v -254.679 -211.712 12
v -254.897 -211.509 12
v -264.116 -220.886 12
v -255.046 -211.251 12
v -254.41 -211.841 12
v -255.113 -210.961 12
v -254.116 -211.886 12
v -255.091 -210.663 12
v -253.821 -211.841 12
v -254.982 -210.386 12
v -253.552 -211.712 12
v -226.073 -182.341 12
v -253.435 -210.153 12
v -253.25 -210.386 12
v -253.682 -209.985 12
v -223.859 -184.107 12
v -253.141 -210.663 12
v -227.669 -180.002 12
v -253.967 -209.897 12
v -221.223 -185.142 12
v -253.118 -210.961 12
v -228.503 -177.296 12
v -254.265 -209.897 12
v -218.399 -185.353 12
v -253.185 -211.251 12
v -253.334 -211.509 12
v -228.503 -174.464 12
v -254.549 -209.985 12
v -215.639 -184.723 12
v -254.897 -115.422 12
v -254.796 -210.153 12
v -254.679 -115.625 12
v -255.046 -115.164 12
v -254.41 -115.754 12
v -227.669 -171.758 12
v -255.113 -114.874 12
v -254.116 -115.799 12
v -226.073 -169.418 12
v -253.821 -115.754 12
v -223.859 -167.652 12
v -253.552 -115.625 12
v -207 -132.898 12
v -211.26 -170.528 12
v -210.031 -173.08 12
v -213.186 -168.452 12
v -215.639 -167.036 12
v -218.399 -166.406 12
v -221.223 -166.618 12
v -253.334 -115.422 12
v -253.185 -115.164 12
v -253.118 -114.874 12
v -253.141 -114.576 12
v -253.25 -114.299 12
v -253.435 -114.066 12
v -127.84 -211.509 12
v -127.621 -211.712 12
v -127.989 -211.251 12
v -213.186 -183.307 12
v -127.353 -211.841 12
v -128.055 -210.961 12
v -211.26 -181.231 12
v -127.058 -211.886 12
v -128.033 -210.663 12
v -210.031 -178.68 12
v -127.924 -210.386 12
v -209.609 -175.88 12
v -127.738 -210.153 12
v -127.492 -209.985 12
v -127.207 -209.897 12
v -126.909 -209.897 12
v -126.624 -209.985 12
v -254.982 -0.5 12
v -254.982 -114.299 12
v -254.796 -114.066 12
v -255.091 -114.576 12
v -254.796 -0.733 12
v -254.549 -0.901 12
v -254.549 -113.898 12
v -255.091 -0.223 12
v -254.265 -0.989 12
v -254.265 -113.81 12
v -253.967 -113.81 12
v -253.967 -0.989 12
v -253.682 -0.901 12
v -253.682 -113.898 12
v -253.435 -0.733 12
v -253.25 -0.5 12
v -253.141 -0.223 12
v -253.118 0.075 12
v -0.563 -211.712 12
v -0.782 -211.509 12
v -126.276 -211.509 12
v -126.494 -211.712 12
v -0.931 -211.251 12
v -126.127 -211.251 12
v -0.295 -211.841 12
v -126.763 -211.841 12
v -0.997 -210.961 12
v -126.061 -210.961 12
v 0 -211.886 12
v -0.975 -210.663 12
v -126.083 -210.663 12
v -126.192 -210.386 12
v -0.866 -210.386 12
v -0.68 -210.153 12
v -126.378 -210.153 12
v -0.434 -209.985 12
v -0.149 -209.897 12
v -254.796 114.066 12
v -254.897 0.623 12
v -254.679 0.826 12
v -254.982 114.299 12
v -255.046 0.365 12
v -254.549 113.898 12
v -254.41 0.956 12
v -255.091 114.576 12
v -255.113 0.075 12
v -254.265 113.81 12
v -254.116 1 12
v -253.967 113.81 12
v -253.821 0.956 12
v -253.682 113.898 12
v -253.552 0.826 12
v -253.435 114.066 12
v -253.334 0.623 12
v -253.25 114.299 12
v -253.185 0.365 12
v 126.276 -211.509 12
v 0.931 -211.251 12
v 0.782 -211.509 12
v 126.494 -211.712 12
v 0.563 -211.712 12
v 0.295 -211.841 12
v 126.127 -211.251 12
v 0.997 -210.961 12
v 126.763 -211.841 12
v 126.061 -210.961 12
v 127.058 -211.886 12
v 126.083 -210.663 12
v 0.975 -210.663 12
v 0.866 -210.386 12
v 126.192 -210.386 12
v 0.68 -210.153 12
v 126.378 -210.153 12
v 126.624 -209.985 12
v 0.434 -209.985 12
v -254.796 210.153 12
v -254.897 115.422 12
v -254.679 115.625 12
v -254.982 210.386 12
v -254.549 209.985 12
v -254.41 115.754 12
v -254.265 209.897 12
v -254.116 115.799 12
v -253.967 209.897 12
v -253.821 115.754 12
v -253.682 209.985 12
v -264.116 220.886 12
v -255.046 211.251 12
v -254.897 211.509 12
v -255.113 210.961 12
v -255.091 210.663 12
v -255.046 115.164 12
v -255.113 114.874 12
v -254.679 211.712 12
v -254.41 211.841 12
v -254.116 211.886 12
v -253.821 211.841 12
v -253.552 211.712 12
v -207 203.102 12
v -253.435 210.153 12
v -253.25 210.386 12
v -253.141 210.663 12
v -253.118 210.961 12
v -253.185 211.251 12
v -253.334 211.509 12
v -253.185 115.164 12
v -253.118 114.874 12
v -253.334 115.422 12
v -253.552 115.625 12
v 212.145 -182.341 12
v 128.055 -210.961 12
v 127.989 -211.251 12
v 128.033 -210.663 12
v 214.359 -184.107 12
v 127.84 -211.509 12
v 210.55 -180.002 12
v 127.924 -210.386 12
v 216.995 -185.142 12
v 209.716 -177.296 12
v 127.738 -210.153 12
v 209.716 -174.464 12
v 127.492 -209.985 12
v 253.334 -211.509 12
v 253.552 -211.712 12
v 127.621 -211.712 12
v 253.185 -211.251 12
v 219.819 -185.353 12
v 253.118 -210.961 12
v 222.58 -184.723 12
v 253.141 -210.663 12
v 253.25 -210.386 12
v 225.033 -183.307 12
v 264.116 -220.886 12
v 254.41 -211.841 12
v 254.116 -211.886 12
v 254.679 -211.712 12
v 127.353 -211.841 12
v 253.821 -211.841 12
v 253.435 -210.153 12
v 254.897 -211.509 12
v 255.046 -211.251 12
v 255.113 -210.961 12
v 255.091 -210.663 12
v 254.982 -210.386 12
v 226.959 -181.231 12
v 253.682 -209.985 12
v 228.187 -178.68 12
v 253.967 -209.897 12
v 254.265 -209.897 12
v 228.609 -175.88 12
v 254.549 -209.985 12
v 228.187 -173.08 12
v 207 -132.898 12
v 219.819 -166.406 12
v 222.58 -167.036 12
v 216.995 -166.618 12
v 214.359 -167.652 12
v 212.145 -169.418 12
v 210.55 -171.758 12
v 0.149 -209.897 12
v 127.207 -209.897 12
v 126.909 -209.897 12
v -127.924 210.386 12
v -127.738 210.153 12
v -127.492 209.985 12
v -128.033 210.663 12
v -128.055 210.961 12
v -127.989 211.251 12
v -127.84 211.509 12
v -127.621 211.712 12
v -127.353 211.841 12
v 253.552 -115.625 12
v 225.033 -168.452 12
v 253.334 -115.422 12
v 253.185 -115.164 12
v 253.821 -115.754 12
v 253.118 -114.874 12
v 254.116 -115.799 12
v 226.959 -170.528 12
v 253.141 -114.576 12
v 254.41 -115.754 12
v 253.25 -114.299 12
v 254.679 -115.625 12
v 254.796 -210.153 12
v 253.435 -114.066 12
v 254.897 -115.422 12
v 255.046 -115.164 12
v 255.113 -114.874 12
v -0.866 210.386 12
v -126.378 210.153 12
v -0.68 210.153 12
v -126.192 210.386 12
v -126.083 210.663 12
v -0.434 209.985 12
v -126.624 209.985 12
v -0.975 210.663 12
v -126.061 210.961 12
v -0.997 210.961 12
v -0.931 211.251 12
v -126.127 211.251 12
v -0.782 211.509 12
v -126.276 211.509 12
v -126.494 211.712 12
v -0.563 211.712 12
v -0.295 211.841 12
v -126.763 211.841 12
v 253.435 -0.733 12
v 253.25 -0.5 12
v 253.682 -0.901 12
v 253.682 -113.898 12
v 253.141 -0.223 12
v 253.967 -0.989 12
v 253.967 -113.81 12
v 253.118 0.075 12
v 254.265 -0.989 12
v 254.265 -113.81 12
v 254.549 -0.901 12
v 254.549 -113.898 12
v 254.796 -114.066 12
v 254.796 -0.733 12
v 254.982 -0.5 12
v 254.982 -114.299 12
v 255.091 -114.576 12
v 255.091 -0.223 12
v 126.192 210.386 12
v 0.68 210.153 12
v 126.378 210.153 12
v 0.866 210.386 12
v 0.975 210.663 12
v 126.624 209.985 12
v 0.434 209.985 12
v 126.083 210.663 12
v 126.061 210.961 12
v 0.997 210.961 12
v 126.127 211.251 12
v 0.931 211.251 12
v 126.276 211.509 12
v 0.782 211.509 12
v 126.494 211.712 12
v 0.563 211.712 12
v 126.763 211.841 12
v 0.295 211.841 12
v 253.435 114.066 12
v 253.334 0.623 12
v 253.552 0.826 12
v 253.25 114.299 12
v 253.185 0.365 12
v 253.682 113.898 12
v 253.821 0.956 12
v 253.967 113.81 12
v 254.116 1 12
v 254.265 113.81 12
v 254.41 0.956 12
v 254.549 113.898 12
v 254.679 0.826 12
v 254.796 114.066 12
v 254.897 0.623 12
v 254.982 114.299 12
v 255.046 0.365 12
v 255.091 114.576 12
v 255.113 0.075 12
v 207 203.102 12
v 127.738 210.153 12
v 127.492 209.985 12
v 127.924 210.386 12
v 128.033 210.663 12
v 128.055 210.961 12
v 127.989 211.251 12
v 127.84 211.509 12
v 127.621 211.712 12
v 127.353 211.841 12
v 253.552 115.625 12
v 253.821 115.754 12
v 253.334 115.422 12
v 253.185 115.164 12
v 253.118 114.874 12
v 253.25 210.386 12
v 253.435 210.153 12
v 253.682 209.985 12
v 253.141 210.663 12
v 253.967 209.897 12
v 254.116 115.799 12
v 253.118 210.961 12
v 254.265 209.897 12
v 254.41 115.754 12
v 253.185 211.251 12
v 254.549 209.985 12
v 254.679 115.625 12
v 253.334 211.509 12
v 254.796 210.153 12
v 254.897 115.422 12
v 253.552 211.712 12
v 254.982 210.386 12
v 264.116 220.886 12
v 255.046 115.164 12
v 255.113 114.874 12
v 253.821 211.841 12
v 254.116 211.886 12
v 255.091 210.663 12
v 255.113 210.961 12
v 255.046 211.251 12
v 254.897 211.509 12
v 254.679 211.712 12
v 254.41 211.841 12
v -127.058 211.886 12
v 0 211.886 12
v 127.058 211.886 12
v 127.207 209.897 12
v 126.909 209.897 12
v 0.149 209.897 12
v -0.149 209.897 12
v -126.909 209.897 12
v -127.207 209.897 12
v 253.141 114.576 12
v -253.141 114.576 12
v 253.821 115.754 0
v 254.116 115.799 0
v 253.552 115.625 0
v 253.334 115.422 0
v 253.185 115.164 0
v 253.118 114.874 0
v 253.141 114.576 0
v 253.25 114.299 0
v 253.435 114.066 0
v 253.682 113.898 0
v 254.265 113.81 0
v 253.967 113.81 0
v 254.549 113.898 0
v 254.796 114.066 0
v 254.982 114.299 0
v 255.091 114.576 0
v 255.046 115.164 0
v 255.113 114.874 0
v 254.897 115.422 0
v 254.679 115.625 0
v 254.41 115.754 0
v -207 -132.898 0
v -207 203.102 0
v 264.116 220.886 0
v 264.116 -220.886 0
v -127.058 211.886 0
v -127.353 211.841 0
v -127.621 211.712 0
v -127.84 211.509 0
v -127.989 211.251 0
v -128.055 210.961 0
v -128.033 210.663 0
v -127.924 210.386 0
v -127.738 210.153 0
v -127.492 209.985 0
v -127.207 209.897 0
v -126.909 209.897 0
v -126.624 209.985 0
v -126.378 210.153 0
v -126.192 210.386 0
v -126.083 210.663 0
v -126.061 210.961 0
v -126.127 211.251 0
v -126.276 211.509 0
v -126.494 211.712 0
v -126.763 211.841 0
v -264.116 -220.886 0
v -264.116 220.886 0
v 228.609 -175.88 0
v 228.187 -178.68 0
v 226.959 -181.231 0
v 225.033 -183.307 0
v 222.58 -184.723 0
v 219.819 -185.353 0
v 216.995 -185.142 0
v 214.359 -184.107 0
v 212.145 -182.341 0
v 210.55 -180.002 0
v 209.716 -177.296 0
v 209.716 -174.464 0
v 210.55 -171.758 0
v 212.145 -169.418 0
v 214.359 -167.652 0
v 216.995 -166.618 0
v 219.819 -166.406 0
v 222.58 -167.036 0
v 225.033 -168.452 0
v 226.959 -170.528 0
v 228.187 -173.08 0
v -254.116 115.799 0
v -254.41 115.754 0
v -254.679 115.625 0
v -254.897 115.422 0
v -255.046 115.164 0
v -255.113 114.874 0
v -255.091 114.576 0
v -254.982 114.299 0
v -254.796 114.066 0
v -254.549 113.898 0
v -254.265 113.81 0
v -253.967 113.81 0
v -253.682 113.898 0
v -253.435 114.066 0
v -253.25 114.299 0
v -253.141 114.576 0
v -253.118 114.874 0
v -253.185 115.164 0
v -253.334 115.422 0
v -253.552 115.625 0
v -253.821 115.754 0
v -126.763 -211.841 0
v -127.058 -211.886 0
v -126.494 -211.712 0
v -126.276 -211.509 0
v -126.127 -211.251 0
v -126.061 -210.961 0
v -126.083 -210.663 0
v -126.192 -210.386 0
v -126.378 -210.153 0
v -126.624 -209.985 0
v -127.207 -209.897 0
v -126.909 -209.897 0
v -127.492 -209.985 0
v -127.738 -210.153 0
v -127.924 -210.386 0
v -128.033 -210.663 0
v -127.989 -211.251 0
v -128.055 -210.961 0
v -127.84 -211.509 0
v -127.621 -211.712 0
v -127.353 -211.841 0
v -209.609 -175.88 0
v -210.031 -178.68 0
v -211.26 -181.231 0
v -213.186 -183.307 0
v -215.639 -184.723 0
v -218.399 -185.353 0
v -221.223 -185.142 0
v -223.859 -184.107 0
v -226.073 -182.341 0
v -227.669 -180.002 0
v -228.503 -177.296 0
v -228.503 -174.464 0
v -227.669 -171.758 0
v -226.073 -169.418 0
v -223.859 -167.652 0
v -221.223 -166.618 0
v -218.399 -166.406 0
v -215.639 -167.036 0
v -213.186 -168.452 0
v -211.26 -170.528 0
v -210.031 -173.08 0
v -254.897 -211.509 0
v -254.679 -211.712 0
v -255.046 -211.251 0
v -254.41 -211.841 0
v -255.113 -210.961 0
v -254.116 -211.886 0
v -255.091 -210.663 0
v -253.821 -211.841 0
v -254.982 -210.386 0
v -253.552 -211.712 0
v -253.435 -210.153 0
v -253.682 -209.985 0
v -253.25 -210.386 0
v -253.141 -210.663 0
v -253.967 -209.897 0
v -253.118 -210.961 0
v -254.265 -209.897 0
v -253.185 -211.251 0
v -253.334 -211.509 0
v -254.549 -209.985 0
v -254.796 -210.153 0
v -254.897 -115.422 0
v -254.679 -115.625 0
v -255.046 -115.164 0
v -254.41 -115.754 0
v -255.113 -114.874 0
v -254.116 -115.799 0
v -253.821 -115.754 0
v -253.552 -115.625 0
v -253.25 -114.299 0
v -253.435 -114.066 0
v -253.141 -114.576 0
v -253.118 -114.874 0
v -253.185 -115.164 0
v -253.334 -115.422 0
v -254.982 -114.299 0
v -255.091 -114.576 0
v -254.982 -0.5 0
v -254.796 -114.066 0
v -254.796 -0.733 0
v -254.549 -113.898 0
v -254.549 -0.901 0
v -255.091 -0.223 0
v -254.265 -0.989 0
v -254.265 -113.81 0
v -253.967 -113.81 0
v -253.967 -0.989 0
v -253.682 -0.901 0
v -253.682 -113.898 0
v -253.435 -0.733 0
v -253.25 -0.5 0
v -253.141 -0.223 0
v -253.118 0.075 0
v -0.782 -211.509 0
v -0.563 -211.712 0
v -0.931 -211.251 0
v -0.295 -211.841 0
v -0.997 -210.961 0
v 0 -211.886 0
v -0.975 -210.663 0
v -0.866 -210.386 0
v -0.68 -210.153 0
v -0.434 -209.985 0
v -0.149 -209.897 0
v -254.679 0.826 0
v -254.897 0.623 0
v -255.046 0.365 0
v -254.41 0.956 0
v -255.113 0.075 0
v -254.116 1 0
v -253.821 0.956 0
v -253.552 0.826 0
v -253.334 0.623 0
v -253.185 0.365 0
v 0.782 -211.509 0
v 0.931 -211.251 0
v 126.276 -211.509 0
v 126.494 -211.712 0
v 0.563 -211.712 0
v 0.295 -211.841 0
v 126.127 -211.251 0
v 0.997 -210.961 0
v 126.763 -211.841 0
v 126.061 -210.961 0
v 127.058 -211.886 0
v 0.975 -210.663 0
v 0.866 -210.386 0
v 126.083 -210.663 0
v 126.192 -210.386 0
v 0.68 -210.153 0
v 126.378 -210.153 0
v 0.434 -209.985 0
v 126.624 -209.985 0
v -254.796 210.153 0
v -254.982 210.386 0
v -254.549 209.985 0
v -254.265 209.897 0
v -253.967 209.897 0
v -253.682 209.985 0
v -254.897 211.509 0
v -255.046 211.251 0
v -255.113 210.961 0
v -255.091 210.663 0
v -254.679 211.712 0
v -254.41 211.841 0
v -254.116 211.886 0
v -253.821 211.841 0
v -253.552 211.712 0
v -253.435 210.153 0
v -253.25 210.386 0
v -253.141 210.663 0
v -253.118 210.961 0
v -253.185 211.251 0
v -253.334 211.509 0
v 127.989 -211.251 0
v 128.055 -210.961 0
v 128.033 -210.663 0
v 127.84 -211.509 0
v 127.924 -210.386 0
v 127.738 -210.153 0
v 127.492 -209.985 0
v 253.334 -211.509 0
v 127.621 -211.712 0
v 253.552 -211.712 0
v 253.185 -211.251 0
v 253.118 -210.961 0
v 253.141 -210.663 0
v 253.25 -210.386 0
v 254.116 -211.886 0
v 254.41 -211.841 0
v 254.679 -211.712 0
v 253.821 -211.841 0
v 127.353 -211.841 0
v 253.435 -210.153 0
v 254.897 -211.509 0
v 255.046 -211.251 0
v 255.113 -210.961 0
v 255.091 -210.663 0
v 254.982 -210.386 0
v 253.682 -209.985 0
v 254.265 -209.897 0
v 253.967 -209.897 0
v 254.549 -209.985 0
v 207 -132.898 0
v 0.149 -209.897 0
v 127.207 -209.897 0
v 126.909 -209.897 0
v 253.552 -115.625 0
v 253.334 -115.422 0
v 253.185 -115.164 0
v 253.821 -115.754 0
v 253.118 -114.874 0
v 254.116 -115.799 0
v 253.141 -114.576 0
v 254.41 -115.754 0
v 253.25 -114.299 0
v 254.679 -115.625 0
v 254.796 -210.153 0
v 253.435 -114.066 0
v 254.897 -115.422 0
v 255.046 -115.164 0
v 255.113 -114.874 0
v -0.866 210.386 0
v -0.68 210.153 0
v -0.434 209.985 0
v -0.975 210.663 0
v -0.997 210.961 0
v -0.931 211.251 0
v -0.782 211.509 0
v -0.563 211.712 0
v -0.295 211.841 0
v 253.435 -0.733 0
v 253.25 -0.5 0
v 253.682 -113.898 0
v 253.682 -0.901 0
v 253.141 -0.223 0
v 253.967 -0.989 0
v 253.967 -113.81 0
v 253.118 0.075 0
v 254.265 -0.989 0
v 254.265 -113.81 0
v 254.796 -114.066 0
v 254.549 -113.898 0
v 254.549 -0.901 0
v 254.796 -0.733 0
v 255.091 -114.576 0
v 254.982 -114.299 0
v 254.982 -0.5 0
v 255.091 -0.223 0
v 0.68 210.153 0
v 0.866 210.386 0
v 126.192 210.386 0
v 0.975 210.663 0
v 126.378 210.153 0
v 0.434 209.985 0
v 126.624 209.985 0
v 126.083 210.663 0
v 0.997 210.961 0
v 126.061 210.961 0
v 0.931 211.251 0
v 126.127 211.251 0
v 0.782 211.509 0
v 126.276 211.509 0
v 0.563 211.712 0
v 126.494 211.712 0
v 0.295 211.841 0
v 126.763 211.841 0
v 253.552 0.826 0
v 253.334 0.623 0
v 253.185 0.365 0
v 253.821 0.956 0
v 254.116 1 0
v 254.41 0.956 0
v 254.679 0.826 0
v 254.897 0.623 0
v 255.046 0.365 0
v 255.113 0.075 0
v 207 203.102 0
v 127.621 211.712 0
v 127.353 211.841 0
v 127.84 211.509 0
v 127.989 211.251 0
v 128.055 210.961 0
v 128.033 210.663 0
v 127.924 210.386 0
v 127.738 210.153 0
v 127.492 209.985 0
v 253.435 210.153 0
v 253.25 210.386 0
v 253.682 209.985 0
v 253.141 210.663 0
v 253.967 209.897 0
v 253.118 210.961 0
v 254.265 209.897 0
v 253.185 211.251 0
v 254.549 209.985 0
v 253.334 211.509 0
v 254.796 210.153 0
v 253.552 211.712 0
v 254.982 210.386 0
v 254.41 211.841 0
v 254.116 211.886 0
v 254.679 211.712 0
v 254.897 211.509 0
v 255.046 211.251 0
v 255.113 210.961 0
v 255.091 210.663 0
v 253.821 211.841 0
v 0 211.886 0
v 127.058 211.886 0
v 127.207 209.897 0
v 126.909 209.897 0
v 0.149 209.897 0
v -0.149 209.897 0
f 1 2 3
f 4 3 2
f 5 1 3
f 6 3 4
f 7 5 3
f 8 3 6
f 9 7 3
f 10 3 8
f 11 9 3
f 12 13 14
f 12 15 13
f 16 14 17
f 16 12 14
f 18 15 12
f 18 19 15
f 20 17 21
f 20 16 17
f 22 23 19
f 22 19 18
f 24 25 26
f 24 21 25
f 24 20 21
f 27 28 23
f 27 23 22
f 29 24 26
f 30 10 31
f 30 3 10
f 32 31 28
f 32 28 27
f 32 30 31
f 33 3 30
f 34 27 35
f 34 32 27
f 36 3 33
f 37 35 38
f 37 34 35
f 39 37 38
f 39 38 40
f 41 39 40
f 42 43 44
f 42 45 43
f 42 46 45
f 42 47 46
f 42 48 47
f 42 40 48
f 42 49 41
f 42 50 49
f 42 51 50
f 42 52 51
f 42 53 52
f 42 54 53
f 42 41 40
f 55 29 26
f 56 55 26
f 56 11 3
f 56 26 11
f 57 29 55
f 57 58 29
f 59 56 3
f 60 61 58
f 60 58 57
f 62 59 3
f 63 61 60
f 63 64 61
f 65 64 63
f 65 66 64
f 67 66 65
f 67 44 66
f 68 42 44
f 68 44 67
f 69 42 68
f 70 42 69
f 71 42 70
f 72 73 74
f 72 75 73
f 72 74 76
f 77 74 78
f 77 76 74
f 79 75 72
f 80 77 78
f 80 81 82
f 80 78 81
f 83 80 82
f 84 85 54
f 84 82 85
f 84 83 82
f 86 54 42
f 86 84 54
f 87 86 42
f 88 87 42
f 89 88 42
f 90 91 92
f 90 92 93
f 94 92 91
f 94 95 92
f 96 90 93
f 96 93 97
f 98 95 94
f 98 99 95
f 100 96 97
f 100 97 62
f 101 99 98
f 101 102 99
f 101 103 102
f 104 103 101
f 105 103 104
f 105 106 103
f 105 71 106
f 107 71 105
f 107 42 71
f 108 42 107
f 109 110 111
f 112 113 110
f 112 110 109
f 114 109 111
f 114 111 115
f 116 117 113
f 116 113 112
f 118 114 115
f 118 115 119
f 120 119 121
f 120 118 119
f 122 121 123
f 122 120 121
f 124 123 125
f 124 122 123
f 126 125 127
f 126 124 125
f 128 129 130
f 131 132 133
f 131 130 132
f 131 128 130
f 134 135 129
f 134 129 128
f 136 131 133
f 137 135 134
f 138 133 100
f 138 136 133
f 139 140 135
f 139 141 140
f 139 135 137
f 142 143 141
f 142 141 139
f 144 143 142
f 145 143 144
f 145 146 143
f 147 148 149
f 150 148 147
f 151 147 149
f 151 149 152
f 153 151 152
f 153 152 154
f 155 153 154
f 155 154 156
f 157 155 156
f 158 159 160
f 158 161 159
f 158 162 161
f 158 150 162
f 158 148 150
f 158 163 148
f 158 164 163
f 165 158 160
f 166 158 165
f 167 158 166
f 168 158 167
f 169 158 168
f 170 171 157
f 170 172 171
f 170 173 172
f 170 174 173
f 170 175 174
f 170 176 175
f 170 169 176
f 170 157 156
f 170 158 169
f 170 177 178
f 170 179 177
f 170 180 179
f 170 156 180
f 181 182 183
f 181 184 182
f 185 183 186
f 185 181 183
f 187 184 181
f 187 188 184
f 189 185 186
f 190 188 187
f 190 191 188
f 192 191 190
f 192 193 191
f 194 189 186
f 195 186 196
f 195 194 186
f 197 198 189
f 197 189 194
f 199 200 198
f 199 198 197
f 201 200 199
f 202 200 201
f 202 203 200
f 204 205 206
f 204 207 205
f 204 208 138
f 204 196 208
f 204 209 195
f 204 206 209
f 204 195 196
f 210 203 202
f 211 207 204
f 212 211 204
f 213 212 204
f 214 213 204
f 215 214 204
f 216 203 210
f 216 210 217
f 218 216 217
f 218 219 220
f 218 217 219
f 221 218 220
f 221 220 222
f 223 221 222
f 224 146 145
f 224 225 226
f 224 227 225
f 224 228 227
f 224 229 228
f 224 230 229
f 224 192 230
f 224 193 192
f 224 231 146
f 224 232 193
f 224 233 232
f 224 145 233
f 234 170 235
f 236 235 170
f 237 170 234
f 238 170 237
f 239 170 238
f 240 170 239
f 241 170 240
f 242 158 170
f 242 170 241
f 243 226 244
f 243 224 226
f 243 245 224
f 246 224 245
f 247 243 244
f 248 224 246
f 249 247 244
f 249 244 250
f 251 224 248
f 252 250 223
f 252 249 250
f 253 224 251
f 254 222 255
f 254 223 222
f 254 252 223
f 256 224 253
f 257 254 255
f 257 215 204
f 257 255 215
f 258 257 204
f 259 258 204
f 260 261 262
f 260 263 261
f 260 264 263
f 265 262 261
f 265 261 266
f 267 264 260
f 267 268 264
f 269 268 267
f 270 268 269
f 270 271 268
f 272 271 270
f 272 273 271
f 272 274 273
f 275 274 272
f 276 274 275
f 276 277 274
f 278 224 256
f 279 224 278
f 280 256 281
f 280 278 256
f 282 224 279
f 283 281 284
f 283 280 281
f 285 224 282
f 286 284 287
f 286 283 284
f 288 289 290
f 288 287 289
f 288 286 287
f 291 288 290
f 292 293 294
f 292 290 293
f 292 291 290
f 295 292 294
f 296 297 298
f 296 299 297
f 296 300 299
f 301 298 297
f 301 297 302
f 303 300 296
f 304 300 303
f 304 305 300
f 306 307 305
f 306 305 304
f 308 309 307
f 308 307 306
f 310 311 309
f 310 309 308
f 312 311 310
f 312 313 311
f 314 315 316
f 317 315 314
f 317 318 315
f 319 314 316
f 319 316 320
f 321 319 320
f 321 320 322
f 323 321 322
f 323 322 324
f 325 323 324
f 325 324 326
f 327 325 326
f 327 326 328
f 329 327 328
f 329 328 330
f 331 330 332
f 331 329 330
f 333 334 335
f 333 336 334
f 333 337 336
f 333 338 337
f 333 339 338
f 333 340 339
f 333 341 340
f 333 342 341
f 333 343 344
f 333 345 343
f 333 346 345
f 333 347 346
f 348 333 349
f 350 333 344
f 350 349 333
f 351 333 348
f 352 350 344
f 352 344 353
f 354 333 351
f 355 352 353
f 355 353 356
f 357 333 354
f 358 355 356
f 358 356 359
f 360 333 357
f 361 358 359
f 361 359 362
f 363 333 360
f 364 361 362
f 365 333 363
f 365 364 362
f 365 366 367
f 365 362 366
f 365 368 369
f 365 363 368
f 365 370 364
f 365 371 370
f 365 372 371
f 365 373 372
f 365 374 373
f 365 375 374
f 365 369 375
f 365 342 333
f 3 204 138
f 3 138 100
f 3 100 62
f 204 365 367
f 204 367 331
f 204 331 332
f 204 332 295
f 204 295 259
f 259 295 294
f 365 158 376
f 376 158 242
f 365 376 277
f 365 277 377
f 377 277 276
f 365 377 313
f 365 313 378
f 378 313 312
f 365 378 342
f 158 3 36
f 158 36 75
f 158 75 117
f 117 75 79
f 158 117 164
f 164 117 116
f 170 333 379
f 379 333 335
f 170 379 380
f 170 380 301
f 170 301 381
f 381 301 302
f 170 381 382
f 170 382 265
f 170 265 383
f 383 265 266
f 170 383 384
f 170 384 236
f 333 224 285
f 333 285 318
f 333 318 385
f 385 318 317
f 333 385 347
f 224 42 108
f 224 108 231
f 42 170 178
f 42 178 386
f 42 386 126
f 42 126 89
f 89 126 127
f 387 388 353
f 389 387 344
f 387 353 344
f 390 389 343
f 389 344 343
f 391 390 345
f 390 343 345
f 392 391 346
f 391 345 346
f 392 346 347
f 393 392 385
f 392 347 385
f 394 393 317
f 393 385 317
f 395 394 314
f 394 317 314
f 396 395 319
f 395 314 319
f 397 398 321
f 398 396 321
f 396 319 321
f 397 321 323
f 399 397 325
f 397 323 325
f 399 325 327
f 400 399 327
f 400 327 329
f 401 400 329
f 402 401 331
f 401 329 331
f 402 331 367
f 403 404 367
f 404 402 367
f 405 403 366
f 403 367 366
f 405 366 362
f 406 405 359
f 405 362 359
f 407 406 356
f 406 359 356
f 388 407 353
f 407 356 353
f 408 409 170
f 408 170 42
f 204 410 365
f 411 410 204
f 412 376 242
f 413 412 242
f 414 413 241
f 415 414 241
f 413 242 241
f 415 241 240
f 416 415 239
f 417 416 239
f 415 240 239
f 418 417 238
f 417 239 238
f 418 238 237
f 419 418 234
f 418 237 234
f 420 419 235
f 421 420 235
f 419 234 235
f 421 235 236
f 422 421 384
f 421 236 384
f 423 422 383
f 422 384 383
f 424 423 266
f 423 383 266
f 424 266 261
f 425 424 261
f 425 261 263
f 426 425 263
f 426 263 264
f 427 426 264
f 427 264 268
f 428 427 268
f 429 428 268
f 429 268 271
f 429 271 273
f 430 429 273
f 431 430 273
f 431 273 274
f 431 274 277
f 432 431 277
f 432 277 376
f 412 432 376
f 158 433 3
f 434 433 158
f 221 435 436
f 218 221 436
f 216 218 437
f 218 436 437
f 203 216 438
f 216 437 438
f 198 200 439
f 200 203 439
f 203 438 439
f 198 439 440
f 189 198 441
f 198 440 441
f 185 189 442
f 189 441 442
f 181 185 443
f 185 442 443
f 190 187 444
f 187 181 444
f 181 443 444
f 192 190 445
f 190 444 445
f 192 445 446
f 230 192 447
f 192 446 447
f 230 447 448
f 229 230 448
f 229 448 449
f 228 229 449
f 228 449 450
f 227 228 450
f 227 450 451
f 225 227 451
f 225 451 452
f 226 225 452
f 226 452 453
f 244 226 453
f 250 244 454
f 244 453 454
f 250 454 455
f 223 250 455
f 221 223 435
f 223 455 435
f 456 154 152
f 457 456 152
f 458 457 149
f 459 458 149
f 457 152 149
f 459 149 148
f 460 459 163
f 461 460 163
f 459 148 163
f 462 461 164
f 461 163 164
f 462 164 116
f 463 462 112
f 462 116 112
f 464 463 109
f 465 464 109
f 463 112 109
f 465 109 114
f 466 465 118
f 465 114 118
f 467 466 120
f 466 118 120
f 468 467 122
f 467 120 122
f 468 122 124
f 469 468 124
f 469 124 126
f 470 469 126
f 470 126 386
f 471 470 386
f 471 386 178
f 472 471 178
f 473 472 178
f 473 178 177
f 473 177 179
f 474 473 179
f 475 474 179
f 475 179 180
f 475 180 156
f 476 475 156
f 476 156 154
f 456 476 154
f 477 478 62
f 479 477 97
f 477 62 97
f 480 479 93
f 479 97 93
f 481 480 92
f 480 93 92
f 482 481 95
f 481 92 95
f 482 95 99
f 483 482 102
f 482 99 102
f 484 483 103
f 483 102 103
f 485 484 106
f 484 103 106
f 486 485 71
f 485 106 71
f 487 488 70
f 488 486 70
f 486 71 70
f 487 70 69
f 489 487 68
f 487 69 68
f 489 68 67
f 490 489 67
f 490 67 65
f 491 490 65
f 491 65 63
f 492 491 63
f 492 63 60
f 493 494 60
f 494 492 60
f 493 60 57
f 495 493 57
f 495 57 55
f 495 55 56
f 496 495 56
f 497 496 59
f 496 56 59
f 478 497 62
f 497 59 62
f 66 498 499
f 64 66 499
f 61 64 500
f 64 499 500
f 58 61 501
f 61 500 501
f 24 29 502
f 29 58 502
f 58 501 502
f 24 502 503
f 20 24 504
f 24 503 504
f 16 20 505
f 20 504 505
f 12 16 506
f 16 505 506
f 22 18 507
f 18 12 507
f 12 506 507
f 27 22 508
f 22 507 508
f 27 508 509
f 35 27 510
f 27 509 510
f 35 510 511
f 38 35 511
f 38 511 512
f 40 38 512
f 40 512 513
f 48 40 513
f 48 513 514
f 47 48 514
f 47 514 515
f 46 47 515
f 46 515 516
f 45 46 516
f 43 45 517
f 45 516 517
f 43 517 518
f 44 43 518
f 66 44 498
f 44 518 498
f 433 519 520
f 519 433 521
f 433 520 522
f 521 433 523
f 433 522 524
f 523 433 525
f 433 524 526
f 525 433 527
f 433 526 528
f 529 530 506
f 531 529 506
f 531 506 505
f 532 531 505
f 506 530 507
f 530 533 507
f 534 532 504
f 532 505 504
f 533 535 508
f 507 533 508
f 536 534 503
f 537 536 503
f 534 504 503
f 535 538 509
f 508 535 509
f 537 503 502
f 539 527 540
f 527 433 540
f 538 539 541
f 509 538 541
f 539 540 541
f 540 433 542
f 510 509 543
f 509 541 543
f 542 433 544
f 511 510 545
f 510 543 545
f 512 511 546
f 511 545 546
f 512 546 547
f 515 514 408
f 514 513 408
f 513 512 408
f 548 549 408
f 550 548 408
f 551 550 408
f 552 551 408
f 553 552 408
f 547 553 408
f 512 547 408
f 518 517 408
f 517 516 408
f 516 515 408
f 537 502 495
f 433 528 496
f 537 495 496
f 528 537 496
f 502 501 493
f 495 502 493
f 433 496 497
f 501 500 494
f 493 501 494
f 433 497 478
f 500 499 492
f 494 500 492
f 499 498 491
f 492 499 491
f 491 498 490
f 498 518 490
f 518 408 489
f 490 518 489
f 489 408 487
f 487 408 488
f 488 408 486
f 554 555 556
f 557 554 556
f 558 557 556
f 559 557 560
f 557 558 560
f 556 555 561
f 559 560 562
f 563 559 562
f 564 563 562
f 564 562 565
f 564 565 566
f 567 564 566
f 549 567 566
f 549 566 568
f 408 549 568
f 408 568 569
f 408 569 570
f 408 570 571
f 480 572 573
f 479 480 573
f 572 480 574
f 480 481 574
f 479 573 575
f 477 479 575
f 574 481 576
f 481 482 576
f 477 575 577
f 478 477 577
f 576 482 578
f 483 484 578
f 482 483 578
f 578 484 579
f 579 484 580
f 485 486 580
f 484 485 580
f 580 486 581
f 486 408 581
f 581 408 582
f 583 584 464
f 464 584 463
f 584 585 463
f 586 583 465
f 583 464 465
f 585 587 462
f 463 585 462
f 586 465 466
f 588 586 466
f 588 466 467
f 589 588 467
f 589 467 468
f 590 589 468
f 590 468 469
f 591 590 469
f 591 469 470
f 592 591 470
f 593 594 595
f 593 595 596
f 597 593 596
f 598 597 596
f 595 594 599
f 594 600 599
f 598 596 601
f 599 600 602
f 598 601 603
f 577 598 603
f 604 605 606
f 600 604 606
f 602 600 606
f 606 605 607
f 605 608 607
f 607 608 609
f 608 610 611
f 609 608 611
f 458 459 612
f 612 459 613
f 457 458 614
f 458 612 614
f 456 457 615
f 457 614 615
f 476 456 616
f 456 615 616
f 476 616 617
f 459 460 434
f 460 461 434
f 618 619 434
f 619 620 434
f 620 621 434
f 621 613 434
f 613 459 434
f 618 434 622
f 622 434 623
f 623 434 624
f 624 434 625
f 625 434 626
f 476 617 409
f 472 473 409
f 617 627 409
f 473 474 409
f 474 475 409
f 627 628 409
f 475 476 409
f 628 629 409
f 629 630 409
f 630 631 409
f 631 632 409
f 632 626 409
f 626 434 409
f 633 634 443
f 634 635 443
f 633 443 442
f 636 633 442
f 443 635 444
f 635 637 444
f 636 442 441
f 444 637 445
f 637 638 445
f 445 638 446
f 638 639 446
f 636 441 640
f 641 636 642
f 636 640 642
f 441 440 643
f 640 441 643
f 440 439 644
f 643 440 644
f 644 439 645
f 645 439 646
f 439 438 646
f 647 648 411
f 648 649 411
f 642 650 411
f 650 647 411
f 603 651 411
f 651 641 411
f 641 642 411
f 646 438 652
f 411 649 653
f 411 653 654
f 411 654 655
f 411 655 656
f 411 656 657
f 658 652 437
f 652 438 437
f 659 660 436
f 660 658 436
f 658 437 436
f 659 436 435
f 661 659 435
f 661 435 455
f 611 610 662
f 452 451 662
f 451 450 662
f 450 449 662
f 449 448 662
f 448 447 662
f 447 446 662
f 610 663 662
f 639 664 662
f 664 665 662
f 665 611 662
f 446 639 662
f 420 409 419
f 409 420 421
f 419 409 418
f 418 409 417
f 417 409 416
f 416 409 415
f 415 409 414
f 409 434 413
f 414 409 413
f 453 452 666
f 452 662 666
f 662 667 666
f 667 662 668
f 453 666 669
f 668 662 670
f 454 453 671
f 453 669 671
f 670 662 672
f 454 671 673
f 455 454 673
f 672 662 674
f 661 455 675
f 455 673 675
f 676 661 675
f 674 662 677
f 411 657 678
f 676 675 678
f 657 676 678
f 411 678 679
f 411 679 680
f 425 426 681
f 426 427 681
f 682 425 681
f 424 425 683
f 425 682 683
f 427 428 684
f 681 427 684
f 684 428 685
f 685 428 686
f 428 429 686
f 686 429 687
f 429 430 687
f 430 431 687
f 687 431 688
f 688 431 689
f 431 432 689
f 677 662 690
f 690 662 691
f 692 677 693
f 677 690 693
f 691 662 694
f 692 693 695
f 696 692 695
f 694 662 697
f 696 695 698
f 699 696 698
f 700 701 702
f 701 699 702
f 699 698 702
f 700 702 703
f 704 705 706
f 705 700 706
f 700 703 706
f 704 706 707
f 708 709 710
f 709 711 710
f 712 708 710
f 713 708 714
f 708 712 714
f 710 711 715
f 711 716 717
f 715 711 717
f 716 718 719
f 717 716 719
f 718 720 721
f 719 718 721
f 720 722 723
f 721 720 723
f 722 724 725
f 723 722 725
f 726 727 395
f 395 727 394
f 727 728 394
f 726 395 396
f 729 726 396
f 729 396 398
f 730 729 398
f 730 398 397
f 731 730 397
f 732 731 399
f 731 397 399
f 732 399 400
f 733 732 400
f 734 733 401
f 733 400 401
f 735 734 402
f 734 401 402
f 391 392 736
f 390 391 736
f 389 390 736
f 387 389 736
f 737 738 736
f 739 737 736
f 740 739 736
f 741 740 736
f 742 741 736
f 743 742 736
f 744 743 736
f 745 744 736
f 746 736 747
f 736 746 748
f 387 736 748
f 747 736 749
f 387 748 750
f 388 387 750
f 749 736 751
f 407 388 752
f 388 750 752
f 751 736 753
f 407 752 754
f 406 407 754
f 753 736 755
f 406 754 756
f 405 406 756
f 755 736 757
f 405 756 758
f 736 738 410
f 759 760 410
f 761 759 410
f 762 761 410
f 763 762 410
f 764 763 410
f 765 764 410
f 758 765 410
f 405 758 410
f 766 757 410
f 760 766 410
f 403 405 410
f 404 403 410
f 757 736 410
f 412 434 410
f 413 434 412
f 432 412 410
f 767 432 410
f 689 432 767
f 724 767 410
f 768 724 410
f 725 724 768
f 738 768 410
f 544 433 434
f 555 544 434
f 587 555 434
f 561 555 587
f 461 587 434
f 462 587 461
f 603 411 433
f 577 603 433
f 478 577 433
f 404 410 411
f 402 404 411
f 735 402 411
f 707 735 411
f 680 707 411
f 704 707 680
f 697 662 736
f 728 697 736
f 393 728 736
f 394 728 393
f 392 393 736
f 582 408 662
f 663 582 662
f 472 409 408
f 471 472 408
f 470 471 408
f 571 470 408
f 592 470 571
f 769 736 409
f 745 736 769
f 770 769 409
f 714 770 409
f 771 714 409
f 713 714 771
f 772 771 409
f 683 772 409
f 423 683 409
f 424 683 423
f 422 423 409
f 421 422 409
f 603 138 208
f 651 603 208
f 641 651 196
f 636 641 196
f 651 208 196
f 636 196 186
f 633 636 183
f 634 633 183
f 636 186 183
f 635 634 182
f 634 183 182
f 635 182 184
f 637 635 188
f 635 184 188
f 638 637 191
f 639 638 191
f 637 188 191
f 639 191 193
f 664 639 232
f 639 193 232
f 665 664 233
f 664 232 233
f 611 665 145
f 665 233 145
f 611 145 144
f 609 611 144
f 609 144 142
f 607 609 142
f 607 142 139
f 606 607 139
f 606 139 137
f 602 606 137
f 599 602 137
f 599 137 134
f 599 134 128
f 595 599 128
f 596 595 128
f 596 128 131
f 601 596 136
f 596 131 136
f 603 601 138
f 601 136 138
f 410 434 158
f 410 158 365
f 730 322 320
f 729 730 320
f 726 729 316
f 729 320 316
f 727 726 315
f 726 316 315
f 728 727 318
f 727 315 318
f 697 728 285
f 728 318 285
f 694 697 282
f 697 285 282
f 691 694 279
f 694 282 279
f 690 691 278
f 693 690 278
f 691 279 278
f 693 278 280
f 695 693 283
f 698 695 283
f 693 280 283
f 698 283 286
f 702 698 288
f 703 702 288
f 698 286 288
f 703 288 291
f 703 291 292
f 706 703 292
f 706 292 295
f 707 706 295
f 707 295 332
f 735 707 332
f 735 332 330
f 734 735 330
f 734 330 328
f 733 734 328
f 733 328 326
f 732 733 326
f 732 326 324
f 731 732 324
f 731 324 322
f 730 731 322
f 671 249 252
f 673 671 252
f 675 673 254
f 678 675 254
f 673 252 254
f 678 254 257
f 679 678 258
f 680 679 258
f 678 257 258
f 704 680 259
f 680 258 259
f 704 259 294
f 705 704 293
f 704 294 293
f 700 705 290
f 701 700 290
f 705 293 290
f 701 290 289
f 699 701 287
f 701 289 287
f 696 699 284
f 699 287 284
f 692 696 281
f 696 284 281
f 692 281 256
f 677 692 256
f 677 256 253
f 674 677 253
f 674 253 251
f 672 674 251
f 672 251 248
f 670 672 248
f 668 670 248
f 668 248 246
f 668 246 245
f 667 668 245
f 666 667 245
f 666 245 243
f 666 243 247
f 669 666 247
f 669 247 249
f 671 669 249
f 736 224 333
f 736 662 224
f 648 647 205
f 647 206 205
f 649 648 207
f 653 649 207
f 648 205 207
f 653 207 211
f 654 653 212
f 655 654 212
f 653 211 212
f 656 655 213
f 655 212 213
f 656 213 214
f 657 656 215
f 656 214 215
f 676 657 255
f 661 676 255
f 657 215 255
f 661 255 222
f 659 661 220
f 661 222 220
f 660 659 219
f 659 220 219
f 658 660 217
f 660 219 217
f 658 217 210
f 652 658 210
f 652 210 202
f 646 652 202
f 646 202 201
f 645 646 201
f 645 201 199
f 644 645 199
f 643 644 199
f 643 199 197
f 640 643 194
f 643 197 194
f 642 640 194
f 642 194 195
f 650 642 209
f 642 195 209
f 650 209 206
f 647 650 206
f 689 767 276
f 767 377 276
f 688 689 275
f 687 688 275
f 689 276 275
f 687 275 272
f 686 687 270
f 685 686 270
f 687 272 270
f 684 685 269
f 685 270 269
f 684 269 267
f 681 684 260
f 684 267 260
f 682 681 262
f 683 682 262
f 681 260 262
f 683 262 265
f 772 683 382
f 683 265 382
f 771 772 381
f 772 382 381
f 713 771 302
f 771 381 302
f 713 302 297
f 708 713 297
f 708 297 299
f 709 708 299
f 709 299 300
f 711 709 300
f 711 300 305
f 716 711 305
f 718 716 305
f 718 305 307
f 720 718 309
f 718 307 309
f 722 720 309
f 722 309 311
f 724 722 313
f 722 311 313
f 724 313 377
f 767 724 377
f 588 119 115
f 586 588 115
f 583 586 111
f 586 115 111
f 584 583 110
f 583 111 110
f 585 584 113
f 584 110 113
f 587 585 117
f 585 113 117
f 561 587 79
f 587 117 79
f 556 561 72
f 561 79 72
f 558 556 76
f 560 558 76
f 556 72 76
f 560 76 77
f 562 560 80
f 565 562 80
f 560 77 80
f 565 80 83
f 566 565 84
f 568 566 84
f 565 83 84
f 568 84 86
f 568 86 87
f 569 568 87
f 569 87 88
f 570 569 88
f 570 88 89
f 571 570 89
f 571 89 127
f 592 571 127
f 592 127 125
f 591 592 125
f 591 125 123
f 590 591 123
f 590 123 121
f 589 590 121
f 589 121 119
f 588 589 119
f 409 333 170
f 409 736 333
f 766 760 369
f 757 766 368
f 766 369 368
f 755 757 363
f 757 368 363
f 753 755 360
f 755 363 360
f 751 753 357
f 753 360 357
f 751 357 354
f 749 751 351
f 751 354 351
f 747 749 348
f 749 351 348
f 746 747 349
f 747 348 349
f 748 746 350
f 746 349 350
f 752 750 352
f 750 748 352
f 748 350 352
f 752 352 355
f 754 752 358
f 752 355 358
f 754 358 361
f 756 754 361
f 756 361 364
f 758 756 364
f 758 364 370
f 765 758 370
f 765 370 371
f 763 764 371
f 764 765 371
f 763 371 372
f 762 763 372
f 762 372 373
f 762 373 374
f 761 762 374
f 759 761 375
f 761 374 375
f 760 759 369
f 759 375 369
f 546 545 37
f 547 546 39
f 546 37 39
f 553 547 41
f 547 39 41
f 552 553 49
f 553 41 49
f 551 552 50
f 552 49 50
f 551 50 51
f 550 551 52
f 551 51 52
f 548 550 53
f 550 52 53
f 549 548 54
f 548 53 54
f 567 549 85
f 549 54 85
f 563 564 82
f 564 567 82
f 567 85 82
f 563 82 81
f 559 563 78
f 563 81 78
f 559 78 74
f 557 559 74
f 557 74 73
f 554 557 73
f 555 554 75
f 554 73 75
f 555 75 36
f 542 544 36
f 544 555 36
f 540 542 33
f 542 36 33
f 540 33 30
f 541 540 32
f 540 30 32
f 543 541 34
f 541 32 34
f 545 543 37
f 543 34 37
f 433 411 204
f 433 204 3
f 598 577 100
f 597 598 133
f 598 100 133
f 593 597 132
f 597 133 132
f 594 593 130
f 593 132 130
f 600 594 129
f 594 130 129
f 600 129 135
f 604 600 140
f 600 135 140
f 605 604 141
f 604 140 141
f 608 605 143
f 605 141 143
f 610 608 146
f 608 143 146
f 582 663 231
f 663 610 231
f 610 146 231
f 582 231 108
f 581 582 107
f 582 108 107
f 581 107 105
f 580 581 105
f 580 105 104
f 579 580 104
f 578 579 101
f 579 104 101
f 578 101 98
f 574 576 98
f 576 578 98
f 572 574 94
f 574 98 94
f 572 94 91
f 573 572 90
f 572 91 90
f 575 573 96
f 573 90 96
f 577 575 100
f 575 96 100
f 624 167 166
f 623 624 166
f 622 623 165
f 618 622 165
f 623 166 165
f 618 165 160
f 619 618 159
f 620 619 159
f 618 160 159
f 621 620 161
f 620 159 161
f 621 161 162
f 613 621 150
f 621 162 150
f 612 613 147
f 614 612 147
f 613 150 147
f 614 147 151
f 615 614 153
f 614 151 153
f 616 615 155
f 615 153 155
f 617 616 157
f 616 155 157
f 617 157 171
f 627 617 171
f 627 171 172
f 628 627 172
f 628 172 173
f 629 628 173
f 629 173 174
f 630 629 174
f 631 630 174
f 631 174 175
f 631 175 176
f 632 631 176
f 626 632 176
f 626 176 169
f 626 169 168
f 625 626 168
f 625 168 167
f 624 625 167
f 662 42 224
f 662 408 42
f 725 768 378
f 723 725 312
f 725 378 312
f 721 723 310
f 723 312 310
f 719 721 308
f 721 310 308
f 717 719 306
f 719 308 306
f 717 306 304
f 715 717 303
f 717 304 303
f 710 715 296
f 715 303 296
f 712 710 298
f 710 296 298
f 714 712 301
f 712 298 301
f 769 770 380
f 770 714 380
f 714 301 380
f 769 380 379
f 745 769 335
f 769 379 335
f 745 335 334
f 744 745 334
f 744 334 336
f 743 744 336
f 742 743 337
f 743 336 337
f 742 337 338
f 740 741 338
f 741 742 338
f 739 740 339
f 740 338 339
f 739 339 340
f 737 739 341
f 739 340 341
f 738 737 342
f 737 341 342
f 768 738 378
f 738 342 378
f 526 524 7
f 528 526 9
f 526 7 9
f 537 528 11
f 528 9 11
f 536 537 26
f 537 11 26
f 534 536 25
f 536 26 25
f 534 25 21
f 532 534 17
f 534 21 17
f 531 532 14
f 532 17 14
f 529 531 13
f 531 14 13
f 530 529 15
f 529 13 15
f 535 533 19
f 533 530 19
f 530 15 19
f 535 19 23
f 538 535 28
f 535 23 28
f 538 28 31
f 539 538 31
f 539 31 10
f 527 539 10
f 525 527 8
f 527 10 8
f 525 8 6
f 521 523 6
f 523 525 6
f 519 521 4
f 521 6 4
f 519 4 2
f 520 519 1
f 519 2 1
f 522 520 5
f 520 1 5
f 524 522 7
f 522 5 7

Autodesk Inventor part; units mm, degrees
ref_plane "YZ Plane" through (0, 0, 0) normal (1, 0, 0) x (0, 1, 0)
ref_plane "XZ Plane" through (0, 0, 0) normal (0, 1, 0) x (-1, 0, 0)
ref_plane "XY Plane" through (0, 0, 0) normal (0, 0, 1) x (1, 0, 0)
sketch "Sketch1" plane through (0, 0, 0) normal (0, 0, 1) x (1, 0, 0)
  circle A0 centre (-219.1094, -175.8797) radius 11.5 projected
  circle A1 centre (219.1094, -175.8797) radius 11.5 projected
  line L0 (264.1156, -220.8859) -> (-264.1156, -220.8859) projected
  line L1 (264.1156, 220.8859) -> (264.1156, -220.8859) projected
  line L2 (-264.1156, 220.8859) -> (264.1156, 220.8859) projected
  line L3 (-264.1156, -220.8859) -> (-264.1156, 220.8859) projected
  line L4 (200, 196.1016) -> (-200, 196.1016) projected
  line L5 (200, -131.8984) -> (200, 196.1016) projected
  line L6 (-200, -131.8984) -> (200, -131.8984) projected
  line L7 (-200, 196.1016) -> (-200, -131.8984) projected
  line L8 (139, 202.1016) -> (119, 202.1016) projected
  line L9 (206, 187.0016) -> (206, 167.0016) projected
  line L10 (-206, 187.0016) -> (-206, 167.0016) projected
  line L11 (-206, -102.7984) -> (-206, -122.7984) projected
  line L12 (206, -122.7984) -> (206, -102.7984) projected
  line L13 (-206, 202.1016) -> (206, 202.1016)
  line L14 (206, 202.1016) -> (206, -131.8984)
  line L15 (206, -131.8984) -> (-206, -131.8984)
  line L16 (-206, -131.8984) -> (-206, 202.1016)
  line L17 (207, 203.1016) -> (-207, 203.1016)
  line L18 (-207, 203.1016) -> (-207, -132.8984)
  line L19 (-207, -132.8984) -> (207, -132.8984)
  line L20 (207, -132.8984) -> (207, 203.1016)
  circle A2 centre (219.1094, -175.8797) radius 9.5 projected
  circle A3 centre (-219.1094, -175.8797) radius 9.5 projected
  circle A4 centre (-219.1094, -175.8797) radius 11.5 projected
  circle A5 centre (-219.1094, -175.8797) radius 11.5 projected
  circle A6 centre (-219.1094, -175.8797) radius 11.5 projected
  point P0 (0, 0)
  dimension "d0" = 1
extrude "Extrusion1" add sketch "Sketch1" along normal blind 12 contours A0 | A1 | L0 L3 L2 L1
sketch "Sketch2" plane through (0, 0, 0) normal (0, 0, -1) x (-1, 0, 0)
  line L0 (0, 210.8859) -> (254.1156, 210.8859) construction
  line L1 (254.1156, 210.8859) -> (254.1156, 0) construction
  line L2 (254.1156, 0) -> (0, 0) construction
  line L3 (0, 0) -> (0, 210.8859) construction
  line L4 (-264.1156, 220.8859) -> (264.1156, 220.8859) construction
  line L5 (264.1156, 220.8859) -> (264.1156, -220.8859) construction
  point P0 (127.0578, 210.8859)
  point P1 (254.1156, 114.7989)
  dimension "d3" = 10
  dimension "d4" = 10
hole "Hole1" at (0, 210.8859, 0) at (-127.0578, 210.8859, 0) at (-254.1156, 210.8859, 0) at (-254.1156, 114.7989, 0) at (-254.1156, 0, 0) direction (0, 0, 1) diameter 2 end through all
mirror "Mirror1" about plane through (0, 0, 0) normal (1, 0, 0) of "Hole1"
mirror "Mirror2" about plane through (0, 0, 0) normal (0, 1, 0) of "Hole1", "Mirror1"
properties part number "lag3"
